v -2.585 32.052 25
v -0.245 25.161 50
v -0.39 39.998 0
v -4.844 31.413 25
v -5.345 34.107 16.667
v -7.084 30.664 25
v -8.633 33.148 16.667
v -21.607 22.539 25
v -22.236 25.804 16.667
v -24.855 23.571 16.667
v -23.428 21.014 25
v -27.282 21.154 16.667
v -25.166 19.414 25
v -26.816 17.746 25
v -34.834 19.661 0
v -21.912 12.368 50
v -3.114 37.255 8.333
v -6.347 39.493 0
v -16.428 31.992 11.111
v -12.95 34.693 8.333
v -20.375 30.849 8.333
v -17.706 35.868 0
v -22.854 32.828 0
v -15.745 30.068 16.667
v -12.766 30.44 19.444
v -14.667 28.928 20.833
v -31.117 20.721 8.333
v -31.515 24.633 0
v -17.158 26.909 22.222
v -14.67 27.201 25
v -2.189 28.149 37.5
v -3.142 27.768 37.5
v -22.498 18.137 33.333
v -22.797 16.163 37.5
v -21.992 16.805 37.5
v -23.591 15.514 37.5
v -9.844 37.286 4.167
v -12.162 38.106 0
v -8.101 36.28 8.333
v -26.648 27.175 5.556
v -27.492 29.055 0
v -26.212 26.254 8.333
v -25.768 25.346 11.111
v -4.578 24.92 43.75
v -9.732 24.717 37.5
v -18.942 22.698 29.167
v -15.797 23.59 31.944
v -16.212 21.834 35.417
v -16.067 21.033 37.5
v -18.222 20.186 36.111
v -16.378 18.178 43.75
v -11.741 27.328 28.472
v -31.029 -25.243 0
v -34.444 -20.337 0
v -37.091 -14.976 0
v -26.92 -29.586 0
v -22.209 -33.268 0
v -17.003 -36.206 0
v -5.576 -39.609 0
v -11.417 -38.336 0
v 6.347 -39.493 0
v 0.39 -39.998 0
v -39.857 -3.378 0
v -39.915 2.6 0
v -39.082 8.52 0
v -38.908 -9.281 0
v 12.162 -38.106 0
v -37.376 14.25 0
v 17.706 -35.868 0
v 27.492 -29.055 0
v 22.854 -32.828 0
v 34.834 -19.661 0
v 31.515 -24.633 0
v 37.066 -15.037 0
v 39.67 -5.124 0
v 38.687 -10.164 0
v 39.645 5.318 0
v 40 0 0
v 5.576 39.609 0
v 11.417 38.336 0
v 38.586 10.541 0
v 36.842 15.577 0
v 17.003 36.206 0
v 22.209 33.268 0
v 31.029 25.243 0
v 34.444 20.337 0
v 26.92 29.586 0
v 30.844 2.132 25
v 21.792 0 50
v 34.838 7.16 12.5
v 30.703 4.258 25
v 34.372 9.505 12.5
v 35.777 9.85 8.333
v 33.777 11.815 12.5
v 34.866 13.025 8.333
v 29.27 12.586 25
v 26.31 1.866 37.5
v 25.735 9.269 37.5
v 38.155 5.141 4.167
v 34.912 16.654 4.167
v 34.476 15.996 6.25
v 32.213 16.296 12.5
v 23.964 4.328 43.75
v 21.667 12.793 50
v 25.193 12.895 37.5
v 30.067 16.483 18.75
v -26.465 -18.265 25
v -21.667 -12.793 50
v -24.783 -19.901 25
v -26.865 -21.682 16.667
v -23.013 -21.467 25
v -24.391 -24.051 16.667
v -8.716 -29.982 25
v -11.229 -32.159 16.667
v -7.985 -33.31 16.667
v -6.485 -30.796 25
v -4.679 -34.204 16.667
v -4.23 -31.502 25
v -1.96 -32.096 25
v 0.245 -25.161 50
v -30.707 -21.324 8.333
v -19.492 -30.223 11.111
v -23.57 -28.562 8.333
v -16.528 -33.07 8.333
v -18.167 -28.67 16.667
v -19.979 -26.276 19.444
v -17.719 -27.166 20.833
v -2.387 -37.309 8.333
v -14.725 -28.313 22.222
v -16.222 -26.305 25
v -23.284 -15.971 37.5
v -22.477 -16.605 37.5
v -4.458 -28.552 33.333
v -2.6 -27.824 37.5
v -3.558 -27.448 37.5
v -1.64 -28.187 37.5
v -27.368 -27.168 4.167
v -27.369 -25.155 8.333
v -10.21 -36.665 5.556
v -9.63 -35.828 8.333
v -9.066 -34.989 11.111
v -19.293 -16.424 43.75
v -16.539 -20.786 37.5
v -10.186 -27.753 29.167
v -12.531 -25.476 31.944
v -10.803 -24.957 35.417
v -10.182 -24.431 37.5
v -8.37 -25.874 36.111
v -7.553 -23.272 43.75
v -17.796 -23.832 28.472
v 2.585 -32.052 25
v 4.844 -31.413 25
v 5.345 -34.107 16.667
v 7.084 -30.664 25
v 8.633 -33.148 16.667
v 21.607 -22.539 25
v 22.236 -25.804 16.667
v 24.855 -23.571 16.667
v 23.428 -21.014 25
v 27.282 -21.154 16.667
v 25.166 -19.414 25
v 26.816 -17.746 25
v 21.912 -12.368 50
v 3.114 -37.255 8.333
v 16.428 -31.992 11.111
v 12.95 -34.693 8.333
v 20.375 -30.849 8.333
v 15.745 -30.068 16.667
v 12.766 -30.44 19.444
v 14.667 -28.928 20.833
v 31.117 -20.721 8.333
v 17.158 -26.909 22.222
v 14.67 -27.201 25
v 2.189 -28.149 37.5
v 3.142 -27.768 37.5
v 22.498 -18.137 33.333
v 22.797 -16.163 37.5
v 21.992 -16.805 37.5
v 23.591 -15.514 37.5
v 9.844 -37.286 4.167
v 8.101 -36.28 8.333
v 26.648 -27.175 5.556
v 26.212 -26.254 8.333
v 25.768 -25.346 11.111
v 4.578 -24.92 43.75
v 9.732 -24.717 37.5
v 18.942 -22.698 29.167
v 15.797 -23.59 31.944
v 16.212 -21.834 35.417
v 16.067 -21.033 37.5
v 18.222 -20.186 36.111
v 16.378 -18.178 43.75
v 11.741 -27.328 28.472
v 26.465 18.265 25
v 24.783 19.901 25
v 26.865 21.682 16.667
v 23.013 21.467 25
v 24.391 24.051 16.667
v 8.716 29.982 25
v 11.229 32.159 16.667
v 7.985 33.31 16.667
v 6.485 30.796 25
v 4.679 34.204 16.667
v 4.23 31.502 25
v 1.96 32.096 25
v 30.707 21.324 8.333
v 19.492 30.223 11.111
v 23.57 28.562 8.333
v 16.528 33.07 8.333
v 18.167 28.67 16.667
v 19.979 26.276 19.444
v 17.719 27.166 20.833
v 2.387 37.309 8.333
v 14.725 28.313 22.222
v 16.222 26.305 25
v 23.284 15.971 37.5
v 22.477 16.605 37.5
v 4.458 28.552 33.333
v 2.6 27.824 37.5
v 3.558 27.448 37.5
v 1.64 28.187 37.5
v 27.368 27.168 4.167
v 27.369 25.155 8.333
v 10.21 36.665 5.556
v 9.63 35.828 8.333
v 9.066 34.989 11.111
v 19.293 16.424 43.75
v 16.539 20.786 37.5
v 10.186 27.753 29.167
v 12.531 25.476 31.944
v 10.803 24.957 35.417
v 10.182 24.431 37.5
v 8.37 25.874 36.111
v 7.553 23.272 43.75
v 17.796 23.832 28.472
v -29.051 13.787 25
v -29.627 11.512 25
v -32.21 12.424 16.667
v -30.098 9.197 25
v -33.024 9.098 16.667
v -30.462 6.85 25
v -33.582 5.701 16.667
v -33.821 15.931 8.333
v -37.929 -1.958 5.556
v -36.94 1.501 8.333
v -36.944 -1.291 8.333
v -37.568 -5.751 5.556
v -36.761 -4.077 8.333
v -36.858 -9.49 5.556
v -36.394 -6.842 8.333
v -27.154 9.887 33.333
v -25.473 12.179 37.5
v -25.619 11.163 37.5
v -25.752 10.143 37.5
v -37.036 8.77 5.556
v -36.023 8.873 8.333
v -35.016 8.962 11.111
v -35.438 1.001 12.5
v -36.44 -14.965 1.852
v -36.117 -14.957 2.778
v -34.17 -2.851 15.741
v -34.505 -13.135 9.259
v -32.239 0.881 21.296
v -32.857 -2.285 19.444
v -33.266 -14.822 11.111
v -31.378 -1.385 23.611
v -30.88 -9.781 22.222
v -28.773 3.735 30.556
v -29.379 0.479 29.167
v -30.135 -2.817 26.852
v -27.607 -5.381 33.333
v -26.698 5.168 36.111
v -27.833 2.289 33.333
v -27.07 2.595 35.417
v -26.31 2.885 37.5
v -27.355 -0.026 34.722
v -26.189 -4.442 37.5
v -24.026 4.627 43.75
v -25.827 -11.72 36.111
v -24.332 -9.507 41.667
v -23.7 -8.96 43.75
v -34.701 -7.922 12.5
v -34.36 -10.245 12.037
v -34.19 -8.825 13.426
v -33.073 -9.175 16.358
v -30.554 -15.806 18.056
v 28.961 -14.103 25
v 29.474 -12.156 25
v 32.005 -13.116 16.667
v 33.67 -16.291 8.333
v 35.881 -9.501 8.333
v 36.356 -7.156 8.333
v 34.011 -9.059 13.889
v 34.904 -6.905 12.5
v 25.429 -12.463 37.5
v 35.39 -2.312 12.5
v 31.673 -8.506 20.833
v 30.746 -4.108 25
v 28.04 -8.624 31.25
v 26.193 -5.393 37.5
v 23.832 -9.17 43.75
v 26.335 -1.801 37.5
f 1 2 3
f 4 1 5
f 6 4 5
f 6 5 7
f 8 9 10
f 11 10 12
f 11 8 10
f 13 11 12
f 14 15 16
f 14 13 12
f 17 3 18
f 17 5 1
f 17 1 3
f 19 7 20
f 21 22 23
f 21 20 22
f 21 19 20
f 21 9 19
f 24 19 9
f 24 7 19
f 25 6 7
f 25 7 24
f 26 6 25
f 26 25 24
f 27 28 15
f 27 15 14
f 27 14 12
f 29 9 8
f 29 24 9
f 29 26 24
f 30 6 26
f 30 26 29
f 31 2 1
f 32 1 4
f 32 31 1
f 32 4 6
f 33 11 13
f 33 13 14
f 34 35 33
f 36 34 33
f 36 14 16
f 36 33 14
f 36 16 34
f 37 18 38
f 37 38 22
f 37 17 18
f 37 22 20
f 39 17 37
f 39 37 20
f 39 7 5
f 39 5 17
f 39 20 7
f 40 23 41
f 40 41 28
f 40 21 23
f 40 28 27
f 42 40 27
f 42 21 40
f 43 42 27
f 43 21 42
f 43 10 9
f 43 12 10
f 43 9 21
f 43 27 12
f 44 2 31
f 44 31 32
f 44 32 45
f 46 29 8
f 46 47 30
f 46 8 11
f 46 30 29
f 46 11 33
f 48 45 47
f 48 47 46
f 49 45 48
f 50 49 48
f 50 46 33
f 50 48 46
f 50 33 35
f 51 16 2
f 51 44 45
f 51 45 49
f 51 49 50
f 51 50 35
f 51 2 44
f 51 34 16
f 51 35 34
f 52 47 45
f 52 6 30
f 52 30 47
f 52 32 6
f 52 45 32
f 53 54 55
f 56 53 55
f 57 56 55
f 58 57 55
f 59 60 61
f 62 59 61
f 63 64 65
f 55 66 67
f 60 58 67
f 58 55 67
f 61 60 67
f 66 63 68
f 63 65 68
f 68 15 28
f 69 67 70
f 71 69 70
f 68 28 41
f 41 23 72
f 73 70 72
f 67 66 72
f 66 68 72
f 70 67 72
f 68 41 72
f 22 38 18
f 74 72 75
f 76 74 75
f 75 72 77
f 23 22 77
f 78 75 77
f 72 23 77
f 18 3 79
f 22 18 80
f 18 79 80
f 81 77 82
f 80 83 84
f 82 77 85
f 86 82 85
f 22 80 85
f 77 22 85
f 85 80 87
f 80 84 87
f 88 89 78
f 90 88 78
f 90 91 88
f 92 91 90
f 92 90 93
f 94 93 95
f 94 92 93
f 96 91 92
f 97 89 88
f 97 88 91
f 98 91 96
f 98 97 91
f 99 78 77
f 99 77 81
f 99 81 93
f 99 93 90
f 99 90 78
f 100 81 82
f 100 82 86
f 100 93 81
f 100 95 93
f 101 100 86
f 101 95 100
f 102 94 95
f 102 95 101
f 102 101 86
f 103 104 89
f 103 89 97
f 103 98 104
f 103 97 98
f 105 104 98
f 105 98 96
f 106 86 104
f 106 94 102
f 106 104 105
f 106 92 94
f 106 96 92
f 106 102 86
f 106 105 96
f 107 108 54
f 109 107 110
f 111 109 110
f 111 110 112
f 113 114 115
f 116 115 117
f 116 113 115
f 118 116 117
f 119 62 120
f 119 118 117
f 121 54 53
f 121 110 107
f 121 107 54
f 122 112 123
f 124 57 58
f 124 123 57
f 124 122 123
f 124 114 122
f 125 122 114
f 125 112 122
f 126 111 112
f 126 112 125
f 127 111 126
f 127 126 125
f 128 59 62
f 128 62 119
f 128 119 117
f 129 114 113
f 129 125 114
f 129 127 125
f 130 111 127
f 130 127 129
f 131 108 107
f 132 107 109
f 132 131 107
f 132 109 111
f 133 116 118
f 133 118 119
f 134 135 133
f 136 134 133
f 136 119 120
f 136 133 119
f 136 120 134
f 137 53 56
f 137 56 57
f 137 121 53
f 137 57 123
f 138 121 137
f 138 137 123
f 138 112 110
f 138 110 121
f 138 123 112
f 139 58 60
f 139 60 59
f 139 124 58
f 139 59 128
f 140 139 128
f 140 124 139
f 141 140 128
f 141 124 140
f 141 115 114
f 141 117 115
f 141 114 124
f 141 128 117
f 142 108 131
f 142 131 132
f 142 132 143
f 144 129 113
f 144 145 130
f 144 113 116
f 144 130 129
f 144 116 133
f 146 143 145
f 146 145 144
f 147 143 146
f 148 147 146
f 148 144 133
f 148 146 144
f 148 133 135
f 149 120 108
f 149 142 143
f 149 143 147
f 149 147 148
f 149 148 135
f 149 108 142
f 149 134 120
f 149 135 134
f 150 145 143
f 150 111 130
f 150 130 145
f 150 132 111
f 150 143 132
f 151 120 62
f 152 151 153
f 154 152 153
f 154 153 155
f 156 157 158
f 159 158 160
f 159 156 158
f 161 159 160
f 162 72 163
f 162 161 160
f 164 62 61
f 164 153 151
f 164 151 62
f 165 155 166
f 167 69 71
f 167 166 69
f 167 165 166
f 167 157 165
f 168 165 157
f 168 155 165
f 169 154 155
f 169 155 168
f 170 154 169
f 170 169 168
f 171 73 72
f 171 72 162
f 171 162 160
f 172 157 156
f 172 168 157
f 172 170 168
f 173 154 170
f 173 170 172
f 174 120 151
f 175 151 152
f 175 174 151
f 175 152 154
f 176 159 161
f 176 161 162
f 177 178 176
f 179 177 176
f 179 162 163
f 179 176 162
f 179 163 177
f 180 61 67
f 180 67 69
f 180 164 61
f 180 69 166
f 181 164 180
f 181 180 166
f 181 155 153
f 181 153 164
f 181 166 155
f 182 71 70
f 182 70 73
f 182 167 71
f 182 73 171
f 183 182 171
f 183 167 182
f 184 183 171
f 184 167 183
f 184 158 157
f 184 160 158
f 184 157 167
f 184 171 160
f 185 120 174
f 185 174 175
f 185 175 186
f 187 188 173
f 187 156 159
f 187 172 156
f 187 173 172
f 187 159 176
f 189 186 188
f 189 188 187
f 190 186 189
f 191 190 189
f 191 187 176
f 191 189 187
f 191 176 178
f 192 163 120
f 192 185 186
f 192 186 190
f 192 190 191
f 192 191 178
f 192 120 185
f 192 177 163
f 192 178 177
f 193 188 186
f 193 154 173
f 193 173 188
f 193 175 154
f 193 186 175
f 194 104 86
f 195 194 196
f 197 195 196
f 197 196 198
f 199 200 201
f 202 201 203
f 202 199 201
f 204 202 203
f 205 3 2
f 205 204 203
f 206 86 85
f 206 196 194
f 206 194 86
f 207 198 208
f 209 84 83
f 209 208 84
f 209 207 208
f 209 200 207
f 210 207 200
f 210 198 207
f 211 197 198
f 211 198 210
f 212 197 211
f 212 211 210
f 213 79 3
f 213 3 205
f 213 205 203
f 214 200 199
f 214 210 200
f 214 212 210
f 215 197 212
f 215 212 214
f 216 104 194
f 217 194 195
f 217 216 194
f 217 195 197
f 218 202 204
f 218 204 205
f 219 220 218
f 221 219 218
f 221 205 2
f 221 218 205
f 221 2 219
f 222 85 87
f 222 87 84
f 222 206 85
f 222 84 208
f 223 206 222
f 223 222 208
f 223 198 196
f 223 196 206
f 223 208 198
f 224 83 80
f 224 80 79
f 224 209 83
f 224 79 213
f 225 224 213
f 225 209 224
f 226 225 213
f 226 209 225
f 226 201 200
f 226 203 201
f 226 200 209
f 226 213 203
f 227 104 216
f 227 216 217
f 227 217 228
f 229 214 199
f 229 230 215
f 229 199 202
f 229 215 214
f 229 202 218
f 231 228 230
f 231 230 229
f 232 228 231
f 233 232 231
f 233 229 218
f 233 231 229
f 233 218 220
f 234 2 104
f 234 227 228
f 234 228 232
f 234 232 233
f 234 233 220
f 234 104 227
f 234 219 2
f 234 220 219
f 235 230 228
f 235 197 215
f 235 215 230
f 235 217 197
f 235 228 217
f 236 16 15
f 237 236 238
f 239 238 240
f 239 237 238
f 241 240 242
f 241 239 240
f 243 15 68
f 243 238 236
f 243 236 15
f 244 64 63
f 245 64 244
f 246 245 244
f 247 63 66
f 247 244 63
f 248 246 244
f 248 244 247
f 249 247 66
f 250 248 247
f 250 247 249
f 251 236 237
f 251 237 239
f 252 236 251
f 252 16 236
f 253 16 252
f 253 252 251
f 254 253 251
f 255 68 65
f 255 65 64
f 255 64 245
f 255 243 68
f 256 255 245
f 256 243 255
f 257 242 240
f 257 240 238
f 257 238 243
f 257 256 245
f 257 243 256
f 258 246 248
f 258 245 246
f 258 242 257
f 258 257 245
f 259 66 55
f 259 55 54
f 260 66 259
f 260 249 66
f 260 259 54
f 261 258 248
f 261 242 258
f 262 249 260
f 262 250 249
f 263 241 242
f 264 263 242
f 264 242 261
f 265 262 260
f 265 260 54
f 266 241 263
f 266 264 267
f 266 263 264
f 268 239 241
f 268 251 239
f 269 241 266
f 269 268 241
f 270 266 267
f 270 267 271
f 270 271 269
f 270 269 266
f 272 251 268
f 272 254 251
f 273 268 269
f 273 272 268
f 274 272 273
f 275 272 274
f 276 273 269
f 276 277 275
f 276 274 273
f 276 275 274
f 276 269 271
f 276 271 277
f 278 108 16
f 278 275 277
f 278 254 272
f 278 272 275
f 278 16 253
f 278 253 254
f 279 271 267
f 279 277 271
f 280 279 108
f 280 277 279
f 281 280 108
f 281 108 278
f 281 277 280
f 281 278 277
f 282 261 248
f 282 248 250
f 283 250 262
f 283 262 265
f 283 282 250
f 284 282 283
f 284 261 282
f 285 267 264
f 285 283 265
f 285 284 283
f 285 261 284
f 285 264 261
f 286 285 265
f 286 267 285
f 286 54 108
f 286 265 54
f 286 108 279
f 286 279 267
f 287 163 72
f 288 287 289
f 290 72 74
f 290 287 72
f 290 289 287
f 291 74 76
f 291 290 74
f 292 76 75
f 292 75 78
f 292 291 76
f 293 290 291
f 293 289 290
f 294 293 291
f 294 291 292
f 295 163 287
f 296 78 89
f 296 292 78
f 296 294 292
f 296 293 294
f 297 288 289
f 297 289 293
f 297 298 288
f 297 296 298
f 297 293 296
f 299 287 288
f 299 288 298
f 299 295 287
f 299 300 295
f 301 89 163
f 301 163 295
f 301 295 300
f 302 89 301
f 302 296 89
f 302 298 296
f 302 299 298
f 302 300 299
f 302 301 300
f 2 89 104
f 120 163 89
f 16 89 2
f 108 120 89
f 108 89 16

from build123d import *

# Parameters (mm, degrees)
F0_R = 40


with BuildPart() as f3:
    # F0 (on Top) → F3 section 0
    with BuildSketch(Plane.XY):
        Circle(F0_R)
    # F2 (on offset) → F3 section 1
    with BuildSketch(Plane.XY.offset(50)):
        Polygon((0.245347, -25.160663), (21.912447, -12.367855), (21.6671, 12.792808), (-0.245347, 25.160663), (-21.912447, 12.367855), (-21.6671, -12.792808), align=None)
    loft()


solid = f3.part
